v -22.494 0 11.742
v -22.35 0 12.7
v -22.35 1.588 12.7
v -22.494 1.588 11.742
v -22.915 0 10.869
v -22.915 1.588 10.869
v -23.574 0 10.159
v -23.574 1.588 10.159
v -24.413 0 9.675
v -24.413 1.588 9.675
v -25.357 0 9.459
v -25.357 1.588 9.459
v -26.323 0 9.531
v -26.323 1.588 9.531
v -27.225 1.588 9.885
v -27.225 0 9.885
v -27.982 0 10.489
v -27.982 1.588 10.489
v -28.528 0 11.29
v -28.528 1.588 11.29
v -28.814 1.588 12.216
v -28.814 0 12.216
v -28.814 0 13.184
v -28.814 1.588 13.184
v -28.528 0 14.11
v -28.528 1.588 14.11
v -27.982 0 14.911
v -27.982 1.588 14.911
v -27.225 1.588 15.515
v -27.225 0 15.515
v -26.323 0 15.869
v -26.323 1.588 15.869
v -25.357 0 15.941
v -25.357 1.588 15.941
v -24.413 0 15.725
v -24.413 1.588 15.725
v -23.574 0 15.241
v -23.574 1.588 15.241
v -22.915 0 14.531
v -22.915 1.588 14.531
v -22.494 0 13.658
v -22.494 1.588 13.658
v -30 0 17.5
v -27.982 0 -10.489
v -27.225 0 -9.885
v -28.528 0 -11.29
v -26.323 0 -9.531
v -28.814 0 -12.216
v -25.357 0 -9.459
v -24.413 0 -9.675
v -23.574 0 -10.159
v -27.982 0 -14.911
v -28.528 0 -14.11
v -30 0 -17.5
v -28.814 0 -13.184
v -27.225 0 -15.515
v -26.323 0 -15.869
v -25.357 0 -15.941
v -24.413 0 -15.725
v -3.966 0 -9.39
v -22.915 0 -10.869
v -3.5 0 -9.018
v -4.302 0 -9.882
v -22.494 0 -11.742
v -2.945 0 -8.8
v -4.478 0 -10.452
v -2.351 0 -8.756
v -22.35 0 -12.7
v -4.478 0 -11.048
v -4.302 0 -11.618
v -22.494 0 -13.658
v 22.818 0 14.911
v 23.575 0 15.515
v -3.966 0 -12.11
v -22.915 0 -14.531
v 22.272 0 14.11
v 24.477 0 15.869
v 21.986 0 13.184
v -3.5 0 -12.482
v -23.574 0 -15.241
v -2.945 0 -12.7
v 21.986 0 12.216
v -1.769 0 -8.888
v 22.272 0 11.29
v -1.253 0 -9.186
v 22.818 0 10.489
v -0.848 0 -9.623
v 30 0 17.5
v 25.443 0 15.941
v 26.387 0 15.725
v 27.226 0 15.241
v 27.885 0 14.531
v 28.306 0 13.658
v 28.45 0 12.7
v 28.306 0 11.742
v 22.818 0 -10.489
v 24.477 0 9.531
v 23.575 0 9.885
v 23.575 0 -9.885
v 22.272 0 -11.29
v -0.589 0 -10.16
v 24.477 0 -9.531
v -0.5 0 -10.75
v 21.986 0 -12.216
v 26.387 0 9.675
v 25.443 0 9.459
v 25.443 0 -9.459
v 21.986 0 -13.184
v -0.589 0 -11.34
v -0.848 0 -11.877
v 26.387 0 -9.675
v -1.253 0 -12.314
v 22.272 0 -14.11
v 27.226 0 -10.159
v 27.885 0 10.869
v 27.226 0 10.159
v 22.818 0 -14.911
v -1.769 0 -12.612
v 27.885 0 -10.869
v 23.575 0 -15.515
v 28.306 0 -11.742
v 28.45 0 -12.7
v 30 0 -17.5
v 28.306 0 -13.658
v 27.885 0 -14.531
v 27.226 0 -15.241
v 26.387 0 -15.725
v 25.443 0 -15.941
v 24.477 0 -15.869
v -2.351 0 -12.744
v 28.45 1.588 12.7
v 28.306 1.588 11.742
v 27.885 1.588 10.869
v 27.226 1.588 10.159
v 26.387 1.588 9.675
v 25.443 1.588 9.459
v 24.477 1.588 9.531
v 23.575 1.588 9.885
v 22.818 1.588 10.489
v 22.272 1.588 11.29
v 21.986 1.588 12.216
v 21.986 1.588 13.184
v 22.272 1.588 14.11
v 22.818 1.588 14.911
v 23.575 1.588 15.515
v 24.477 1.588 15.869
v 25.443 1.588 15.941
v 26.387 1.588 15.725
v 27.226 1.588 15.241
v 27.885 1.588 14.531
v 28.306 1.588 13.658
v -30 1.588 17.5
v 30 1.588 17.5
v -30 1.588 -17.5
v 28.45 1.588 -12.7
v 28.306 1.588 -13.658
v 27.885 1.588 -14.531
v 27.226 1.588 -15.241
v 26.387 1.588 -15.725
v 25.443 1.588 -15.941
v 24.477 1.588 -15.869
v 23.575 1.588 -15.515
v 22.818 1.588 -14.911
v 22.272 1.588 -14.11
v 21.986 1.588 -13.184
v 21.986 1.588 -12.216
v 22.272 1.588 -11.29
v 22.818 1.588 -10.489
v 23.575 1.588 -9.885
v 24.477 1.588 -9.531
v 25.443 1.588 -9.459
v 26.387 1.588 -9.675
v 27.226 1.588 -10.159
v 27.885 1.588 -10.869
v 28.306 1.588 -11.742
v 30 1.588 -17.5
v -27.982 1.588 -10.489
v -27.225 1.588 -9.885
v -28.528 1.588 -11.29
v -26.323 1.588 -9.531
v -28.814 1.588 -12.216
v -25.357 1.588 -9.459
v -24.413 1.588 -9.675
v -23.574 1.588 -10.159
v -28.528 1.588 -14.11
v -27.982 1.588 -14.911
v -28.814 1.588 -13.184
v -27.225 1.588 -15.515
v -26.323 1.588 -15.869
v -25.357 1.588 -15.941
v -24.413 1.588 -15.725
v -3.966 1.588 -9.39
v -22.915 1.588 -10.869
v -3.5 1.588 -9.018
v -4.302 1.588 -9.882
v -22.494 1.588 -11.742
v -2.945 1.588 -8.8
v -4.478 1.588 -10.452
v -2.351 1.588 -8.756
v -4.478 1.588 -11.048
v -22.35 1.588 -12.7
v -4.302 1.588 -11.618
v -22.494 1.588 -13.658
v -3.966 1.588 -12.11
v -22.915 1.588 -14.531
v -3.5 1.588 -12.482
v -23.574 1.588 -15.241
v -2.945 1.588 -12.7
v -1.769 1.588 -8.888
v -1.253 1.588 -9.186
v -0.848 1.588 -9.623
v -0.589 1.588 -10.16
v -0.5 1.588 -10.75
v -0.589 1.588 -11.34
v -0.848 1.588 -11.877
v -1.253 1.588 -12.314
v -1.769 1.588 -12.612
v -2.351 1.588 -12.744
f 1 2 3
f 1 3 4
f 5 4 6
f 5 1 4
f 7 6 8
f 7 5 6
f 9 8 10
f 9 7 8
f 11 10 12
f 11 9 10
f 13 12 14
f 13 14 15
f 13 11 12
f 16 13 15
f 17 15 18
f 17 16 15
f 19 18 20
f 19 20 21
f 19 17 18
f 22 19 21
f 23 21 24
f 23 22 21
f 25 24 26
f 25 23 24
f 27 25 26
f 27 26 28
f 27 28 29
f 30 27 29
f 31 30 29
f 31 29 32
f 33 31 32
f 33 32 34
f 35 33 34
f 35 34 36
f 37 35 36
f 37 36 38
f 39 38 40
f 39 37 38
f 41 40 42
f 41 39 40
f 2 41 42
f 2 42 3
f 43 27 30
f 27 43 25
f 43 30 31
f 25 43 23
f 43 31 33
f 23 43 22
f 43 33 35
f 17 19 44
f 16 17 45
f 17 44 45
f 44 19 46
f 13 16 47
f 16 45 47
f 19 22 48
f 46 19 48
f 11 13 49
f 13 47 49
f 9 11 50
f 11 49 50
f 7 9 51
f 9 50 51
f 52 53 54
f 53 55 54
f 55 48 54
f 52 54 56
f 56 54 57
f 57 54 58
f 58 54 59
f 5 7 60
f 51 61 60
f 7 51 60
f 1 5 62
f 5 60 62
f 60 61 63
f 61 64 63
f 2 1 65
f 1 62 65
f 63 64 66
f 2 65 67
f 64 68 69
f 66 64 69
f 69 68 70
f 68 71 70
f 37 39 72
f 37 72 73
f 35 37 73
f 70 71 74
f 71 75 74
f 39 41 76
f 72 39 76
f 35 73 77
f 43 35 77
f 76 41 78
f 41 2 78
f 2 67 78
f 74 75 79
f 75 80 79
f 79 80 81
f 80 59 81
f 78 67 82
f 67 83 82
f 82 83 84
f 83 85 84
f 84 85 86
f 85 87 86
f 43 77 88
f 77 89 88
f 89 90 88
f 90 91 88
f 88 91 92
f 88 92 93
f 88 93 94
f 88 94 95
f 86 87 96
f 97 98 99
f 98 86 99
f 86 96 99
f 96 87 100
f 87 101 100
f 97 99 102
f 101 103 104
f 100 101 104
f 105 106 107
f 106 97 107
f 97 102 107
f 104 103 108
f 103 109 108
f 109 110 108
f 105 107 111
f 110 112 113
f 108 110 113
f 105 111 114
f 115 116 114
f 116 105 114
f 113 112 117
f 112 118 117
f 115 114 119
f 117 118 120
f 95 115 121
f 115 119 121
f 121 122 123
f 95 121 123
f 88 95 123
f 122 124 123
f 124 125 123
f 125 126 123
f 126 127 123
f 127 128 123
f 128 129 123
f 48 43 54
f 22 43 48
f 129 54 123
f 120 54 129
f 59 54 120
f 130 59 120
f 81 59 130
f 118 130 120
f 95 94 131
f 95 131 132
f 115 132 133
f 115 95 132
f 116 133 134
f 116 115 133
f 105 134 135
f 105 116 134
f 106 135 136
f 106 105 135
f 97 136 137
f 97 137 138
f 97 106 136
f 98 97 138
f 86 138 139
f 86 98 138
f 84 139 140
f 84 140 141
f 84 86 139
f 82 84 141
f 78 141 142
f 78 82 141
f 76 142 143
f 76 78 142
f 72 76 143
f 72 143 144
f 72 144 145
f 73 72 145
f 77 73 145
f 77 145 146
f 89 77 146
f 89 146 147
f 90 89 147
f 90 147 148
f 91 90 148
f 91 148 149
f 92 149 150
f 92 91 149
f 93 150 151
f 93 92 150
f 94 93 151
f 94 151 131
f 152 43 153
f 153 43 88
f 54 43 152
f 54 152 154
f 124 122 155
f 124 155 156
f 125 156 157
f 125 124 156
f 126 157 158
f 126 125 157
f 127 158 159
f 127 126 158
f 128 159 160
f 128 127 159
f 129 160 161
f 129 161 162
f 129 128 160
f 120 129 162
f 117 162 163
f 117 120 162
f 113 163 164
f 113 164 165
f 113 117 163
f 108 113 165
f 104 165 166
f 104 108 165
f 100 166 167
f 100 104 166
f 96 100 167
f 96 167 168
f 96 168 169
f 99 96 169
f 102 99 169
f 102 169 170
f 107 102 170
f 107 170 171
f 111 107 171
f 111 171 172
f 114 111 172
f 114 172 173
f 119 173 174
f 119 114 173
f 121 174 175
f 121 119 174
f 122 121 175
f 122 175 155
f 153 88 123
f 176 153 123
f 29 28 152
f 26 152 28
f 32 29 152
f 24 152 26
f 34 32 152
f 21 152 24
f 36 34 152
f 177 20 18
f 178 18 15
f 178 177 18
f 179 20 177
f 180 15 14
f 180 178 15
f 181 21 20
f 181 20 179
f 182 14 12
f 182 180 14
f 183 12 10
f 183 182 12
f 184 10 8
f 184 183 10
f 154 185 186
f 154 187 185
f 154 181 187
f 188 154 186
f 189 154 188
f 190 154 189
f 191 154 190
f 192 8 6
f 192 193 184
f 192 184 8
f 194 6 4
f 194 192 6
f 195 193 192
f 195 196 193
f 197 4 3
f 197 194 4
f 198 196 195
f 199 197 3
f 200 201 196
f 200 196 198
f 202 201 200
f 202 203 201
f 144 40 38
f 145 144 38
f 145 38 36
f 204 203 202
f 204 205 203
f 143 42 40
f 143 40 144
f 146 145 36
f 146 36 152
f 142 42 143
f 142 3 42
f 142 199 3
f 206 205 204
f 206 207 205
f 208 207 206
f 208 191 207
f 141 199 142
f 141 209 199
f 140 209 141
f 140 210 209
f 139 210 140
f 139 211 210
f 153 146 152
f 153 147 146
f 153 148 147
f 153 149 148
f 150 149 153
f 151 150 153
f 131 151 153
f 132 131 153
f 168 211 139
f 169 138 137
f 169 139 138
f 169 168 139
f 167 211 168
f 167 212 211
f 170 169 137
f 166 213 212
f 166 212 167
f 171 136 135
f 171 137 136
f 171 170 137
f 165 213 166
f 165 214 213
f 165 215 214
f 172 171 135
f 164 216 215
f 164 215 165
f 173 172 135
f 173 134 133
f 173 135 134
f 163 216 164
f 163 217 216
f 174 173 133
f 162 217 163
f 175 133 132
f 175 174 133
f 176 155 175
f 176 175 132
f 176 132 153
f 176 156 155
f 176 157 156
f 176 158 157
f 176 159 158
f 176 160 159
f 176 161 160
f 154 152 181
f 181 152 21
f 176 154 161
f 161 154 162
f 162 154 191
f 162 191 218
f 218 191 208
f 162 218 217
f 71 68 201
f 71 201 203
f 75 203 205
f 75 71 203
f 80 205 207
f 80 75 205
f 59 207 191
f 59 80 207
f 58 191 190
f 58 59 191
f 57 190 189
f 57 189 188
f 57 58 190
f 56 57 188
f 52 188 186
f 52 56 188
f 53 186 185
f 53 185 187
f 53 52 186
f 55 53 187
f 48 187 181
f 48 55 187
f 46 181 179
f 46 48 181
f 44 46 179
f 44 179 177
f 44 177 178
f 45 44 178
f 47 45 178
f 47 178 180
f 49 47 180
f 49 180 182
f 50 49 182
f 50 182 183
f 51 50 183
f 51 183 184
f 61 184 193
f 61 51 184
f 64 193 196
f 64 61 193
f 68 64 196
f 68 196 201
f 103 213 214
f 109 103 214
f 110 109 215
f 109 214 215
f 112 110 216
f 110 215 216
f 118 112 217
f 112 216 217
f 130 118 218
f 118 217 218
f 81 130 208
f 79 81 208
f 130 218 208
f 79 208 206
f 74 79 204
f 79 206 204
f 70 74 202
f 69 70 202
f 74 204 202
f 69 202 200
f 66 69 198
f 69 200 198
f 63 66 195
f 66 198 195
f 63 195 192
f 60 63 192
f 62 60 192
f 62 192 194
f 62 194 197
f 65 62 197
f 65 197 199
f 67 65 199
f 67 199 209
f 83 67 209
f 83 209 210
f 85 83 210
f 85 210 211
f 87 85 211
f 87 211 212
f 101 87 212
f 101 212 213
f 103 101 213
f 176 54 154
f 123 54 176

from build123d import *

# Parameters (mm, degrees)
SKETCH1_W           = 60
SKETCH1_H           = 35
SKETCH1_R           = 3.25
BOSS_EXTRUDE1_DEPTH = 1.5875
SKETCH2_R           = 2
CUT_EXTRUDE1_DEPTH  = 2.5875


with BuildPart() as part:
    # Sketch1 → Boss-Extrude1 (new body)
    with BuildSketch(Plane(origin=(0, 0, 0), x_dir=(1, 0, 0), z_dir=(0, 1, 0))):
        Rectangle(SKETCH1_W, SKETCH1_H)
        with Locations((-25.6, 12.7)):
            Circle(SKETCH1_R, mode=Mode.SUBTRACT)
        with Locations((25.2, 12.7)):
            Circle(SKETCH1_R, mode=Mode.SUBTRACT)
        with Locations((-25.6, -12.7)):
            Circle(SKETCH1_R, mode=Mode.SUBTRACT)
        with Locations((25.2, -12.7)):
            Circle(SKETCH1_R, mode=Mode.SUBTRACT)
    extrude(amount=BOSS_EXTRUDE1_DEPTH)

    # Sketch2 → Cut-Extrude1 (cut, through all)
    with BuildSketch(Plane(origin=(0, 1.5875, 0), x_dir=(1, 0, 0), z_dir=(0, 1, 0))):
        with Locations((-2.5, 10.75)):
            Circle(SKETCH2_R)
    extrude(amount=-CUT_EXTRUDE1_DEPTH, mode=Mode.SUBTRACT)


solid = part.part
